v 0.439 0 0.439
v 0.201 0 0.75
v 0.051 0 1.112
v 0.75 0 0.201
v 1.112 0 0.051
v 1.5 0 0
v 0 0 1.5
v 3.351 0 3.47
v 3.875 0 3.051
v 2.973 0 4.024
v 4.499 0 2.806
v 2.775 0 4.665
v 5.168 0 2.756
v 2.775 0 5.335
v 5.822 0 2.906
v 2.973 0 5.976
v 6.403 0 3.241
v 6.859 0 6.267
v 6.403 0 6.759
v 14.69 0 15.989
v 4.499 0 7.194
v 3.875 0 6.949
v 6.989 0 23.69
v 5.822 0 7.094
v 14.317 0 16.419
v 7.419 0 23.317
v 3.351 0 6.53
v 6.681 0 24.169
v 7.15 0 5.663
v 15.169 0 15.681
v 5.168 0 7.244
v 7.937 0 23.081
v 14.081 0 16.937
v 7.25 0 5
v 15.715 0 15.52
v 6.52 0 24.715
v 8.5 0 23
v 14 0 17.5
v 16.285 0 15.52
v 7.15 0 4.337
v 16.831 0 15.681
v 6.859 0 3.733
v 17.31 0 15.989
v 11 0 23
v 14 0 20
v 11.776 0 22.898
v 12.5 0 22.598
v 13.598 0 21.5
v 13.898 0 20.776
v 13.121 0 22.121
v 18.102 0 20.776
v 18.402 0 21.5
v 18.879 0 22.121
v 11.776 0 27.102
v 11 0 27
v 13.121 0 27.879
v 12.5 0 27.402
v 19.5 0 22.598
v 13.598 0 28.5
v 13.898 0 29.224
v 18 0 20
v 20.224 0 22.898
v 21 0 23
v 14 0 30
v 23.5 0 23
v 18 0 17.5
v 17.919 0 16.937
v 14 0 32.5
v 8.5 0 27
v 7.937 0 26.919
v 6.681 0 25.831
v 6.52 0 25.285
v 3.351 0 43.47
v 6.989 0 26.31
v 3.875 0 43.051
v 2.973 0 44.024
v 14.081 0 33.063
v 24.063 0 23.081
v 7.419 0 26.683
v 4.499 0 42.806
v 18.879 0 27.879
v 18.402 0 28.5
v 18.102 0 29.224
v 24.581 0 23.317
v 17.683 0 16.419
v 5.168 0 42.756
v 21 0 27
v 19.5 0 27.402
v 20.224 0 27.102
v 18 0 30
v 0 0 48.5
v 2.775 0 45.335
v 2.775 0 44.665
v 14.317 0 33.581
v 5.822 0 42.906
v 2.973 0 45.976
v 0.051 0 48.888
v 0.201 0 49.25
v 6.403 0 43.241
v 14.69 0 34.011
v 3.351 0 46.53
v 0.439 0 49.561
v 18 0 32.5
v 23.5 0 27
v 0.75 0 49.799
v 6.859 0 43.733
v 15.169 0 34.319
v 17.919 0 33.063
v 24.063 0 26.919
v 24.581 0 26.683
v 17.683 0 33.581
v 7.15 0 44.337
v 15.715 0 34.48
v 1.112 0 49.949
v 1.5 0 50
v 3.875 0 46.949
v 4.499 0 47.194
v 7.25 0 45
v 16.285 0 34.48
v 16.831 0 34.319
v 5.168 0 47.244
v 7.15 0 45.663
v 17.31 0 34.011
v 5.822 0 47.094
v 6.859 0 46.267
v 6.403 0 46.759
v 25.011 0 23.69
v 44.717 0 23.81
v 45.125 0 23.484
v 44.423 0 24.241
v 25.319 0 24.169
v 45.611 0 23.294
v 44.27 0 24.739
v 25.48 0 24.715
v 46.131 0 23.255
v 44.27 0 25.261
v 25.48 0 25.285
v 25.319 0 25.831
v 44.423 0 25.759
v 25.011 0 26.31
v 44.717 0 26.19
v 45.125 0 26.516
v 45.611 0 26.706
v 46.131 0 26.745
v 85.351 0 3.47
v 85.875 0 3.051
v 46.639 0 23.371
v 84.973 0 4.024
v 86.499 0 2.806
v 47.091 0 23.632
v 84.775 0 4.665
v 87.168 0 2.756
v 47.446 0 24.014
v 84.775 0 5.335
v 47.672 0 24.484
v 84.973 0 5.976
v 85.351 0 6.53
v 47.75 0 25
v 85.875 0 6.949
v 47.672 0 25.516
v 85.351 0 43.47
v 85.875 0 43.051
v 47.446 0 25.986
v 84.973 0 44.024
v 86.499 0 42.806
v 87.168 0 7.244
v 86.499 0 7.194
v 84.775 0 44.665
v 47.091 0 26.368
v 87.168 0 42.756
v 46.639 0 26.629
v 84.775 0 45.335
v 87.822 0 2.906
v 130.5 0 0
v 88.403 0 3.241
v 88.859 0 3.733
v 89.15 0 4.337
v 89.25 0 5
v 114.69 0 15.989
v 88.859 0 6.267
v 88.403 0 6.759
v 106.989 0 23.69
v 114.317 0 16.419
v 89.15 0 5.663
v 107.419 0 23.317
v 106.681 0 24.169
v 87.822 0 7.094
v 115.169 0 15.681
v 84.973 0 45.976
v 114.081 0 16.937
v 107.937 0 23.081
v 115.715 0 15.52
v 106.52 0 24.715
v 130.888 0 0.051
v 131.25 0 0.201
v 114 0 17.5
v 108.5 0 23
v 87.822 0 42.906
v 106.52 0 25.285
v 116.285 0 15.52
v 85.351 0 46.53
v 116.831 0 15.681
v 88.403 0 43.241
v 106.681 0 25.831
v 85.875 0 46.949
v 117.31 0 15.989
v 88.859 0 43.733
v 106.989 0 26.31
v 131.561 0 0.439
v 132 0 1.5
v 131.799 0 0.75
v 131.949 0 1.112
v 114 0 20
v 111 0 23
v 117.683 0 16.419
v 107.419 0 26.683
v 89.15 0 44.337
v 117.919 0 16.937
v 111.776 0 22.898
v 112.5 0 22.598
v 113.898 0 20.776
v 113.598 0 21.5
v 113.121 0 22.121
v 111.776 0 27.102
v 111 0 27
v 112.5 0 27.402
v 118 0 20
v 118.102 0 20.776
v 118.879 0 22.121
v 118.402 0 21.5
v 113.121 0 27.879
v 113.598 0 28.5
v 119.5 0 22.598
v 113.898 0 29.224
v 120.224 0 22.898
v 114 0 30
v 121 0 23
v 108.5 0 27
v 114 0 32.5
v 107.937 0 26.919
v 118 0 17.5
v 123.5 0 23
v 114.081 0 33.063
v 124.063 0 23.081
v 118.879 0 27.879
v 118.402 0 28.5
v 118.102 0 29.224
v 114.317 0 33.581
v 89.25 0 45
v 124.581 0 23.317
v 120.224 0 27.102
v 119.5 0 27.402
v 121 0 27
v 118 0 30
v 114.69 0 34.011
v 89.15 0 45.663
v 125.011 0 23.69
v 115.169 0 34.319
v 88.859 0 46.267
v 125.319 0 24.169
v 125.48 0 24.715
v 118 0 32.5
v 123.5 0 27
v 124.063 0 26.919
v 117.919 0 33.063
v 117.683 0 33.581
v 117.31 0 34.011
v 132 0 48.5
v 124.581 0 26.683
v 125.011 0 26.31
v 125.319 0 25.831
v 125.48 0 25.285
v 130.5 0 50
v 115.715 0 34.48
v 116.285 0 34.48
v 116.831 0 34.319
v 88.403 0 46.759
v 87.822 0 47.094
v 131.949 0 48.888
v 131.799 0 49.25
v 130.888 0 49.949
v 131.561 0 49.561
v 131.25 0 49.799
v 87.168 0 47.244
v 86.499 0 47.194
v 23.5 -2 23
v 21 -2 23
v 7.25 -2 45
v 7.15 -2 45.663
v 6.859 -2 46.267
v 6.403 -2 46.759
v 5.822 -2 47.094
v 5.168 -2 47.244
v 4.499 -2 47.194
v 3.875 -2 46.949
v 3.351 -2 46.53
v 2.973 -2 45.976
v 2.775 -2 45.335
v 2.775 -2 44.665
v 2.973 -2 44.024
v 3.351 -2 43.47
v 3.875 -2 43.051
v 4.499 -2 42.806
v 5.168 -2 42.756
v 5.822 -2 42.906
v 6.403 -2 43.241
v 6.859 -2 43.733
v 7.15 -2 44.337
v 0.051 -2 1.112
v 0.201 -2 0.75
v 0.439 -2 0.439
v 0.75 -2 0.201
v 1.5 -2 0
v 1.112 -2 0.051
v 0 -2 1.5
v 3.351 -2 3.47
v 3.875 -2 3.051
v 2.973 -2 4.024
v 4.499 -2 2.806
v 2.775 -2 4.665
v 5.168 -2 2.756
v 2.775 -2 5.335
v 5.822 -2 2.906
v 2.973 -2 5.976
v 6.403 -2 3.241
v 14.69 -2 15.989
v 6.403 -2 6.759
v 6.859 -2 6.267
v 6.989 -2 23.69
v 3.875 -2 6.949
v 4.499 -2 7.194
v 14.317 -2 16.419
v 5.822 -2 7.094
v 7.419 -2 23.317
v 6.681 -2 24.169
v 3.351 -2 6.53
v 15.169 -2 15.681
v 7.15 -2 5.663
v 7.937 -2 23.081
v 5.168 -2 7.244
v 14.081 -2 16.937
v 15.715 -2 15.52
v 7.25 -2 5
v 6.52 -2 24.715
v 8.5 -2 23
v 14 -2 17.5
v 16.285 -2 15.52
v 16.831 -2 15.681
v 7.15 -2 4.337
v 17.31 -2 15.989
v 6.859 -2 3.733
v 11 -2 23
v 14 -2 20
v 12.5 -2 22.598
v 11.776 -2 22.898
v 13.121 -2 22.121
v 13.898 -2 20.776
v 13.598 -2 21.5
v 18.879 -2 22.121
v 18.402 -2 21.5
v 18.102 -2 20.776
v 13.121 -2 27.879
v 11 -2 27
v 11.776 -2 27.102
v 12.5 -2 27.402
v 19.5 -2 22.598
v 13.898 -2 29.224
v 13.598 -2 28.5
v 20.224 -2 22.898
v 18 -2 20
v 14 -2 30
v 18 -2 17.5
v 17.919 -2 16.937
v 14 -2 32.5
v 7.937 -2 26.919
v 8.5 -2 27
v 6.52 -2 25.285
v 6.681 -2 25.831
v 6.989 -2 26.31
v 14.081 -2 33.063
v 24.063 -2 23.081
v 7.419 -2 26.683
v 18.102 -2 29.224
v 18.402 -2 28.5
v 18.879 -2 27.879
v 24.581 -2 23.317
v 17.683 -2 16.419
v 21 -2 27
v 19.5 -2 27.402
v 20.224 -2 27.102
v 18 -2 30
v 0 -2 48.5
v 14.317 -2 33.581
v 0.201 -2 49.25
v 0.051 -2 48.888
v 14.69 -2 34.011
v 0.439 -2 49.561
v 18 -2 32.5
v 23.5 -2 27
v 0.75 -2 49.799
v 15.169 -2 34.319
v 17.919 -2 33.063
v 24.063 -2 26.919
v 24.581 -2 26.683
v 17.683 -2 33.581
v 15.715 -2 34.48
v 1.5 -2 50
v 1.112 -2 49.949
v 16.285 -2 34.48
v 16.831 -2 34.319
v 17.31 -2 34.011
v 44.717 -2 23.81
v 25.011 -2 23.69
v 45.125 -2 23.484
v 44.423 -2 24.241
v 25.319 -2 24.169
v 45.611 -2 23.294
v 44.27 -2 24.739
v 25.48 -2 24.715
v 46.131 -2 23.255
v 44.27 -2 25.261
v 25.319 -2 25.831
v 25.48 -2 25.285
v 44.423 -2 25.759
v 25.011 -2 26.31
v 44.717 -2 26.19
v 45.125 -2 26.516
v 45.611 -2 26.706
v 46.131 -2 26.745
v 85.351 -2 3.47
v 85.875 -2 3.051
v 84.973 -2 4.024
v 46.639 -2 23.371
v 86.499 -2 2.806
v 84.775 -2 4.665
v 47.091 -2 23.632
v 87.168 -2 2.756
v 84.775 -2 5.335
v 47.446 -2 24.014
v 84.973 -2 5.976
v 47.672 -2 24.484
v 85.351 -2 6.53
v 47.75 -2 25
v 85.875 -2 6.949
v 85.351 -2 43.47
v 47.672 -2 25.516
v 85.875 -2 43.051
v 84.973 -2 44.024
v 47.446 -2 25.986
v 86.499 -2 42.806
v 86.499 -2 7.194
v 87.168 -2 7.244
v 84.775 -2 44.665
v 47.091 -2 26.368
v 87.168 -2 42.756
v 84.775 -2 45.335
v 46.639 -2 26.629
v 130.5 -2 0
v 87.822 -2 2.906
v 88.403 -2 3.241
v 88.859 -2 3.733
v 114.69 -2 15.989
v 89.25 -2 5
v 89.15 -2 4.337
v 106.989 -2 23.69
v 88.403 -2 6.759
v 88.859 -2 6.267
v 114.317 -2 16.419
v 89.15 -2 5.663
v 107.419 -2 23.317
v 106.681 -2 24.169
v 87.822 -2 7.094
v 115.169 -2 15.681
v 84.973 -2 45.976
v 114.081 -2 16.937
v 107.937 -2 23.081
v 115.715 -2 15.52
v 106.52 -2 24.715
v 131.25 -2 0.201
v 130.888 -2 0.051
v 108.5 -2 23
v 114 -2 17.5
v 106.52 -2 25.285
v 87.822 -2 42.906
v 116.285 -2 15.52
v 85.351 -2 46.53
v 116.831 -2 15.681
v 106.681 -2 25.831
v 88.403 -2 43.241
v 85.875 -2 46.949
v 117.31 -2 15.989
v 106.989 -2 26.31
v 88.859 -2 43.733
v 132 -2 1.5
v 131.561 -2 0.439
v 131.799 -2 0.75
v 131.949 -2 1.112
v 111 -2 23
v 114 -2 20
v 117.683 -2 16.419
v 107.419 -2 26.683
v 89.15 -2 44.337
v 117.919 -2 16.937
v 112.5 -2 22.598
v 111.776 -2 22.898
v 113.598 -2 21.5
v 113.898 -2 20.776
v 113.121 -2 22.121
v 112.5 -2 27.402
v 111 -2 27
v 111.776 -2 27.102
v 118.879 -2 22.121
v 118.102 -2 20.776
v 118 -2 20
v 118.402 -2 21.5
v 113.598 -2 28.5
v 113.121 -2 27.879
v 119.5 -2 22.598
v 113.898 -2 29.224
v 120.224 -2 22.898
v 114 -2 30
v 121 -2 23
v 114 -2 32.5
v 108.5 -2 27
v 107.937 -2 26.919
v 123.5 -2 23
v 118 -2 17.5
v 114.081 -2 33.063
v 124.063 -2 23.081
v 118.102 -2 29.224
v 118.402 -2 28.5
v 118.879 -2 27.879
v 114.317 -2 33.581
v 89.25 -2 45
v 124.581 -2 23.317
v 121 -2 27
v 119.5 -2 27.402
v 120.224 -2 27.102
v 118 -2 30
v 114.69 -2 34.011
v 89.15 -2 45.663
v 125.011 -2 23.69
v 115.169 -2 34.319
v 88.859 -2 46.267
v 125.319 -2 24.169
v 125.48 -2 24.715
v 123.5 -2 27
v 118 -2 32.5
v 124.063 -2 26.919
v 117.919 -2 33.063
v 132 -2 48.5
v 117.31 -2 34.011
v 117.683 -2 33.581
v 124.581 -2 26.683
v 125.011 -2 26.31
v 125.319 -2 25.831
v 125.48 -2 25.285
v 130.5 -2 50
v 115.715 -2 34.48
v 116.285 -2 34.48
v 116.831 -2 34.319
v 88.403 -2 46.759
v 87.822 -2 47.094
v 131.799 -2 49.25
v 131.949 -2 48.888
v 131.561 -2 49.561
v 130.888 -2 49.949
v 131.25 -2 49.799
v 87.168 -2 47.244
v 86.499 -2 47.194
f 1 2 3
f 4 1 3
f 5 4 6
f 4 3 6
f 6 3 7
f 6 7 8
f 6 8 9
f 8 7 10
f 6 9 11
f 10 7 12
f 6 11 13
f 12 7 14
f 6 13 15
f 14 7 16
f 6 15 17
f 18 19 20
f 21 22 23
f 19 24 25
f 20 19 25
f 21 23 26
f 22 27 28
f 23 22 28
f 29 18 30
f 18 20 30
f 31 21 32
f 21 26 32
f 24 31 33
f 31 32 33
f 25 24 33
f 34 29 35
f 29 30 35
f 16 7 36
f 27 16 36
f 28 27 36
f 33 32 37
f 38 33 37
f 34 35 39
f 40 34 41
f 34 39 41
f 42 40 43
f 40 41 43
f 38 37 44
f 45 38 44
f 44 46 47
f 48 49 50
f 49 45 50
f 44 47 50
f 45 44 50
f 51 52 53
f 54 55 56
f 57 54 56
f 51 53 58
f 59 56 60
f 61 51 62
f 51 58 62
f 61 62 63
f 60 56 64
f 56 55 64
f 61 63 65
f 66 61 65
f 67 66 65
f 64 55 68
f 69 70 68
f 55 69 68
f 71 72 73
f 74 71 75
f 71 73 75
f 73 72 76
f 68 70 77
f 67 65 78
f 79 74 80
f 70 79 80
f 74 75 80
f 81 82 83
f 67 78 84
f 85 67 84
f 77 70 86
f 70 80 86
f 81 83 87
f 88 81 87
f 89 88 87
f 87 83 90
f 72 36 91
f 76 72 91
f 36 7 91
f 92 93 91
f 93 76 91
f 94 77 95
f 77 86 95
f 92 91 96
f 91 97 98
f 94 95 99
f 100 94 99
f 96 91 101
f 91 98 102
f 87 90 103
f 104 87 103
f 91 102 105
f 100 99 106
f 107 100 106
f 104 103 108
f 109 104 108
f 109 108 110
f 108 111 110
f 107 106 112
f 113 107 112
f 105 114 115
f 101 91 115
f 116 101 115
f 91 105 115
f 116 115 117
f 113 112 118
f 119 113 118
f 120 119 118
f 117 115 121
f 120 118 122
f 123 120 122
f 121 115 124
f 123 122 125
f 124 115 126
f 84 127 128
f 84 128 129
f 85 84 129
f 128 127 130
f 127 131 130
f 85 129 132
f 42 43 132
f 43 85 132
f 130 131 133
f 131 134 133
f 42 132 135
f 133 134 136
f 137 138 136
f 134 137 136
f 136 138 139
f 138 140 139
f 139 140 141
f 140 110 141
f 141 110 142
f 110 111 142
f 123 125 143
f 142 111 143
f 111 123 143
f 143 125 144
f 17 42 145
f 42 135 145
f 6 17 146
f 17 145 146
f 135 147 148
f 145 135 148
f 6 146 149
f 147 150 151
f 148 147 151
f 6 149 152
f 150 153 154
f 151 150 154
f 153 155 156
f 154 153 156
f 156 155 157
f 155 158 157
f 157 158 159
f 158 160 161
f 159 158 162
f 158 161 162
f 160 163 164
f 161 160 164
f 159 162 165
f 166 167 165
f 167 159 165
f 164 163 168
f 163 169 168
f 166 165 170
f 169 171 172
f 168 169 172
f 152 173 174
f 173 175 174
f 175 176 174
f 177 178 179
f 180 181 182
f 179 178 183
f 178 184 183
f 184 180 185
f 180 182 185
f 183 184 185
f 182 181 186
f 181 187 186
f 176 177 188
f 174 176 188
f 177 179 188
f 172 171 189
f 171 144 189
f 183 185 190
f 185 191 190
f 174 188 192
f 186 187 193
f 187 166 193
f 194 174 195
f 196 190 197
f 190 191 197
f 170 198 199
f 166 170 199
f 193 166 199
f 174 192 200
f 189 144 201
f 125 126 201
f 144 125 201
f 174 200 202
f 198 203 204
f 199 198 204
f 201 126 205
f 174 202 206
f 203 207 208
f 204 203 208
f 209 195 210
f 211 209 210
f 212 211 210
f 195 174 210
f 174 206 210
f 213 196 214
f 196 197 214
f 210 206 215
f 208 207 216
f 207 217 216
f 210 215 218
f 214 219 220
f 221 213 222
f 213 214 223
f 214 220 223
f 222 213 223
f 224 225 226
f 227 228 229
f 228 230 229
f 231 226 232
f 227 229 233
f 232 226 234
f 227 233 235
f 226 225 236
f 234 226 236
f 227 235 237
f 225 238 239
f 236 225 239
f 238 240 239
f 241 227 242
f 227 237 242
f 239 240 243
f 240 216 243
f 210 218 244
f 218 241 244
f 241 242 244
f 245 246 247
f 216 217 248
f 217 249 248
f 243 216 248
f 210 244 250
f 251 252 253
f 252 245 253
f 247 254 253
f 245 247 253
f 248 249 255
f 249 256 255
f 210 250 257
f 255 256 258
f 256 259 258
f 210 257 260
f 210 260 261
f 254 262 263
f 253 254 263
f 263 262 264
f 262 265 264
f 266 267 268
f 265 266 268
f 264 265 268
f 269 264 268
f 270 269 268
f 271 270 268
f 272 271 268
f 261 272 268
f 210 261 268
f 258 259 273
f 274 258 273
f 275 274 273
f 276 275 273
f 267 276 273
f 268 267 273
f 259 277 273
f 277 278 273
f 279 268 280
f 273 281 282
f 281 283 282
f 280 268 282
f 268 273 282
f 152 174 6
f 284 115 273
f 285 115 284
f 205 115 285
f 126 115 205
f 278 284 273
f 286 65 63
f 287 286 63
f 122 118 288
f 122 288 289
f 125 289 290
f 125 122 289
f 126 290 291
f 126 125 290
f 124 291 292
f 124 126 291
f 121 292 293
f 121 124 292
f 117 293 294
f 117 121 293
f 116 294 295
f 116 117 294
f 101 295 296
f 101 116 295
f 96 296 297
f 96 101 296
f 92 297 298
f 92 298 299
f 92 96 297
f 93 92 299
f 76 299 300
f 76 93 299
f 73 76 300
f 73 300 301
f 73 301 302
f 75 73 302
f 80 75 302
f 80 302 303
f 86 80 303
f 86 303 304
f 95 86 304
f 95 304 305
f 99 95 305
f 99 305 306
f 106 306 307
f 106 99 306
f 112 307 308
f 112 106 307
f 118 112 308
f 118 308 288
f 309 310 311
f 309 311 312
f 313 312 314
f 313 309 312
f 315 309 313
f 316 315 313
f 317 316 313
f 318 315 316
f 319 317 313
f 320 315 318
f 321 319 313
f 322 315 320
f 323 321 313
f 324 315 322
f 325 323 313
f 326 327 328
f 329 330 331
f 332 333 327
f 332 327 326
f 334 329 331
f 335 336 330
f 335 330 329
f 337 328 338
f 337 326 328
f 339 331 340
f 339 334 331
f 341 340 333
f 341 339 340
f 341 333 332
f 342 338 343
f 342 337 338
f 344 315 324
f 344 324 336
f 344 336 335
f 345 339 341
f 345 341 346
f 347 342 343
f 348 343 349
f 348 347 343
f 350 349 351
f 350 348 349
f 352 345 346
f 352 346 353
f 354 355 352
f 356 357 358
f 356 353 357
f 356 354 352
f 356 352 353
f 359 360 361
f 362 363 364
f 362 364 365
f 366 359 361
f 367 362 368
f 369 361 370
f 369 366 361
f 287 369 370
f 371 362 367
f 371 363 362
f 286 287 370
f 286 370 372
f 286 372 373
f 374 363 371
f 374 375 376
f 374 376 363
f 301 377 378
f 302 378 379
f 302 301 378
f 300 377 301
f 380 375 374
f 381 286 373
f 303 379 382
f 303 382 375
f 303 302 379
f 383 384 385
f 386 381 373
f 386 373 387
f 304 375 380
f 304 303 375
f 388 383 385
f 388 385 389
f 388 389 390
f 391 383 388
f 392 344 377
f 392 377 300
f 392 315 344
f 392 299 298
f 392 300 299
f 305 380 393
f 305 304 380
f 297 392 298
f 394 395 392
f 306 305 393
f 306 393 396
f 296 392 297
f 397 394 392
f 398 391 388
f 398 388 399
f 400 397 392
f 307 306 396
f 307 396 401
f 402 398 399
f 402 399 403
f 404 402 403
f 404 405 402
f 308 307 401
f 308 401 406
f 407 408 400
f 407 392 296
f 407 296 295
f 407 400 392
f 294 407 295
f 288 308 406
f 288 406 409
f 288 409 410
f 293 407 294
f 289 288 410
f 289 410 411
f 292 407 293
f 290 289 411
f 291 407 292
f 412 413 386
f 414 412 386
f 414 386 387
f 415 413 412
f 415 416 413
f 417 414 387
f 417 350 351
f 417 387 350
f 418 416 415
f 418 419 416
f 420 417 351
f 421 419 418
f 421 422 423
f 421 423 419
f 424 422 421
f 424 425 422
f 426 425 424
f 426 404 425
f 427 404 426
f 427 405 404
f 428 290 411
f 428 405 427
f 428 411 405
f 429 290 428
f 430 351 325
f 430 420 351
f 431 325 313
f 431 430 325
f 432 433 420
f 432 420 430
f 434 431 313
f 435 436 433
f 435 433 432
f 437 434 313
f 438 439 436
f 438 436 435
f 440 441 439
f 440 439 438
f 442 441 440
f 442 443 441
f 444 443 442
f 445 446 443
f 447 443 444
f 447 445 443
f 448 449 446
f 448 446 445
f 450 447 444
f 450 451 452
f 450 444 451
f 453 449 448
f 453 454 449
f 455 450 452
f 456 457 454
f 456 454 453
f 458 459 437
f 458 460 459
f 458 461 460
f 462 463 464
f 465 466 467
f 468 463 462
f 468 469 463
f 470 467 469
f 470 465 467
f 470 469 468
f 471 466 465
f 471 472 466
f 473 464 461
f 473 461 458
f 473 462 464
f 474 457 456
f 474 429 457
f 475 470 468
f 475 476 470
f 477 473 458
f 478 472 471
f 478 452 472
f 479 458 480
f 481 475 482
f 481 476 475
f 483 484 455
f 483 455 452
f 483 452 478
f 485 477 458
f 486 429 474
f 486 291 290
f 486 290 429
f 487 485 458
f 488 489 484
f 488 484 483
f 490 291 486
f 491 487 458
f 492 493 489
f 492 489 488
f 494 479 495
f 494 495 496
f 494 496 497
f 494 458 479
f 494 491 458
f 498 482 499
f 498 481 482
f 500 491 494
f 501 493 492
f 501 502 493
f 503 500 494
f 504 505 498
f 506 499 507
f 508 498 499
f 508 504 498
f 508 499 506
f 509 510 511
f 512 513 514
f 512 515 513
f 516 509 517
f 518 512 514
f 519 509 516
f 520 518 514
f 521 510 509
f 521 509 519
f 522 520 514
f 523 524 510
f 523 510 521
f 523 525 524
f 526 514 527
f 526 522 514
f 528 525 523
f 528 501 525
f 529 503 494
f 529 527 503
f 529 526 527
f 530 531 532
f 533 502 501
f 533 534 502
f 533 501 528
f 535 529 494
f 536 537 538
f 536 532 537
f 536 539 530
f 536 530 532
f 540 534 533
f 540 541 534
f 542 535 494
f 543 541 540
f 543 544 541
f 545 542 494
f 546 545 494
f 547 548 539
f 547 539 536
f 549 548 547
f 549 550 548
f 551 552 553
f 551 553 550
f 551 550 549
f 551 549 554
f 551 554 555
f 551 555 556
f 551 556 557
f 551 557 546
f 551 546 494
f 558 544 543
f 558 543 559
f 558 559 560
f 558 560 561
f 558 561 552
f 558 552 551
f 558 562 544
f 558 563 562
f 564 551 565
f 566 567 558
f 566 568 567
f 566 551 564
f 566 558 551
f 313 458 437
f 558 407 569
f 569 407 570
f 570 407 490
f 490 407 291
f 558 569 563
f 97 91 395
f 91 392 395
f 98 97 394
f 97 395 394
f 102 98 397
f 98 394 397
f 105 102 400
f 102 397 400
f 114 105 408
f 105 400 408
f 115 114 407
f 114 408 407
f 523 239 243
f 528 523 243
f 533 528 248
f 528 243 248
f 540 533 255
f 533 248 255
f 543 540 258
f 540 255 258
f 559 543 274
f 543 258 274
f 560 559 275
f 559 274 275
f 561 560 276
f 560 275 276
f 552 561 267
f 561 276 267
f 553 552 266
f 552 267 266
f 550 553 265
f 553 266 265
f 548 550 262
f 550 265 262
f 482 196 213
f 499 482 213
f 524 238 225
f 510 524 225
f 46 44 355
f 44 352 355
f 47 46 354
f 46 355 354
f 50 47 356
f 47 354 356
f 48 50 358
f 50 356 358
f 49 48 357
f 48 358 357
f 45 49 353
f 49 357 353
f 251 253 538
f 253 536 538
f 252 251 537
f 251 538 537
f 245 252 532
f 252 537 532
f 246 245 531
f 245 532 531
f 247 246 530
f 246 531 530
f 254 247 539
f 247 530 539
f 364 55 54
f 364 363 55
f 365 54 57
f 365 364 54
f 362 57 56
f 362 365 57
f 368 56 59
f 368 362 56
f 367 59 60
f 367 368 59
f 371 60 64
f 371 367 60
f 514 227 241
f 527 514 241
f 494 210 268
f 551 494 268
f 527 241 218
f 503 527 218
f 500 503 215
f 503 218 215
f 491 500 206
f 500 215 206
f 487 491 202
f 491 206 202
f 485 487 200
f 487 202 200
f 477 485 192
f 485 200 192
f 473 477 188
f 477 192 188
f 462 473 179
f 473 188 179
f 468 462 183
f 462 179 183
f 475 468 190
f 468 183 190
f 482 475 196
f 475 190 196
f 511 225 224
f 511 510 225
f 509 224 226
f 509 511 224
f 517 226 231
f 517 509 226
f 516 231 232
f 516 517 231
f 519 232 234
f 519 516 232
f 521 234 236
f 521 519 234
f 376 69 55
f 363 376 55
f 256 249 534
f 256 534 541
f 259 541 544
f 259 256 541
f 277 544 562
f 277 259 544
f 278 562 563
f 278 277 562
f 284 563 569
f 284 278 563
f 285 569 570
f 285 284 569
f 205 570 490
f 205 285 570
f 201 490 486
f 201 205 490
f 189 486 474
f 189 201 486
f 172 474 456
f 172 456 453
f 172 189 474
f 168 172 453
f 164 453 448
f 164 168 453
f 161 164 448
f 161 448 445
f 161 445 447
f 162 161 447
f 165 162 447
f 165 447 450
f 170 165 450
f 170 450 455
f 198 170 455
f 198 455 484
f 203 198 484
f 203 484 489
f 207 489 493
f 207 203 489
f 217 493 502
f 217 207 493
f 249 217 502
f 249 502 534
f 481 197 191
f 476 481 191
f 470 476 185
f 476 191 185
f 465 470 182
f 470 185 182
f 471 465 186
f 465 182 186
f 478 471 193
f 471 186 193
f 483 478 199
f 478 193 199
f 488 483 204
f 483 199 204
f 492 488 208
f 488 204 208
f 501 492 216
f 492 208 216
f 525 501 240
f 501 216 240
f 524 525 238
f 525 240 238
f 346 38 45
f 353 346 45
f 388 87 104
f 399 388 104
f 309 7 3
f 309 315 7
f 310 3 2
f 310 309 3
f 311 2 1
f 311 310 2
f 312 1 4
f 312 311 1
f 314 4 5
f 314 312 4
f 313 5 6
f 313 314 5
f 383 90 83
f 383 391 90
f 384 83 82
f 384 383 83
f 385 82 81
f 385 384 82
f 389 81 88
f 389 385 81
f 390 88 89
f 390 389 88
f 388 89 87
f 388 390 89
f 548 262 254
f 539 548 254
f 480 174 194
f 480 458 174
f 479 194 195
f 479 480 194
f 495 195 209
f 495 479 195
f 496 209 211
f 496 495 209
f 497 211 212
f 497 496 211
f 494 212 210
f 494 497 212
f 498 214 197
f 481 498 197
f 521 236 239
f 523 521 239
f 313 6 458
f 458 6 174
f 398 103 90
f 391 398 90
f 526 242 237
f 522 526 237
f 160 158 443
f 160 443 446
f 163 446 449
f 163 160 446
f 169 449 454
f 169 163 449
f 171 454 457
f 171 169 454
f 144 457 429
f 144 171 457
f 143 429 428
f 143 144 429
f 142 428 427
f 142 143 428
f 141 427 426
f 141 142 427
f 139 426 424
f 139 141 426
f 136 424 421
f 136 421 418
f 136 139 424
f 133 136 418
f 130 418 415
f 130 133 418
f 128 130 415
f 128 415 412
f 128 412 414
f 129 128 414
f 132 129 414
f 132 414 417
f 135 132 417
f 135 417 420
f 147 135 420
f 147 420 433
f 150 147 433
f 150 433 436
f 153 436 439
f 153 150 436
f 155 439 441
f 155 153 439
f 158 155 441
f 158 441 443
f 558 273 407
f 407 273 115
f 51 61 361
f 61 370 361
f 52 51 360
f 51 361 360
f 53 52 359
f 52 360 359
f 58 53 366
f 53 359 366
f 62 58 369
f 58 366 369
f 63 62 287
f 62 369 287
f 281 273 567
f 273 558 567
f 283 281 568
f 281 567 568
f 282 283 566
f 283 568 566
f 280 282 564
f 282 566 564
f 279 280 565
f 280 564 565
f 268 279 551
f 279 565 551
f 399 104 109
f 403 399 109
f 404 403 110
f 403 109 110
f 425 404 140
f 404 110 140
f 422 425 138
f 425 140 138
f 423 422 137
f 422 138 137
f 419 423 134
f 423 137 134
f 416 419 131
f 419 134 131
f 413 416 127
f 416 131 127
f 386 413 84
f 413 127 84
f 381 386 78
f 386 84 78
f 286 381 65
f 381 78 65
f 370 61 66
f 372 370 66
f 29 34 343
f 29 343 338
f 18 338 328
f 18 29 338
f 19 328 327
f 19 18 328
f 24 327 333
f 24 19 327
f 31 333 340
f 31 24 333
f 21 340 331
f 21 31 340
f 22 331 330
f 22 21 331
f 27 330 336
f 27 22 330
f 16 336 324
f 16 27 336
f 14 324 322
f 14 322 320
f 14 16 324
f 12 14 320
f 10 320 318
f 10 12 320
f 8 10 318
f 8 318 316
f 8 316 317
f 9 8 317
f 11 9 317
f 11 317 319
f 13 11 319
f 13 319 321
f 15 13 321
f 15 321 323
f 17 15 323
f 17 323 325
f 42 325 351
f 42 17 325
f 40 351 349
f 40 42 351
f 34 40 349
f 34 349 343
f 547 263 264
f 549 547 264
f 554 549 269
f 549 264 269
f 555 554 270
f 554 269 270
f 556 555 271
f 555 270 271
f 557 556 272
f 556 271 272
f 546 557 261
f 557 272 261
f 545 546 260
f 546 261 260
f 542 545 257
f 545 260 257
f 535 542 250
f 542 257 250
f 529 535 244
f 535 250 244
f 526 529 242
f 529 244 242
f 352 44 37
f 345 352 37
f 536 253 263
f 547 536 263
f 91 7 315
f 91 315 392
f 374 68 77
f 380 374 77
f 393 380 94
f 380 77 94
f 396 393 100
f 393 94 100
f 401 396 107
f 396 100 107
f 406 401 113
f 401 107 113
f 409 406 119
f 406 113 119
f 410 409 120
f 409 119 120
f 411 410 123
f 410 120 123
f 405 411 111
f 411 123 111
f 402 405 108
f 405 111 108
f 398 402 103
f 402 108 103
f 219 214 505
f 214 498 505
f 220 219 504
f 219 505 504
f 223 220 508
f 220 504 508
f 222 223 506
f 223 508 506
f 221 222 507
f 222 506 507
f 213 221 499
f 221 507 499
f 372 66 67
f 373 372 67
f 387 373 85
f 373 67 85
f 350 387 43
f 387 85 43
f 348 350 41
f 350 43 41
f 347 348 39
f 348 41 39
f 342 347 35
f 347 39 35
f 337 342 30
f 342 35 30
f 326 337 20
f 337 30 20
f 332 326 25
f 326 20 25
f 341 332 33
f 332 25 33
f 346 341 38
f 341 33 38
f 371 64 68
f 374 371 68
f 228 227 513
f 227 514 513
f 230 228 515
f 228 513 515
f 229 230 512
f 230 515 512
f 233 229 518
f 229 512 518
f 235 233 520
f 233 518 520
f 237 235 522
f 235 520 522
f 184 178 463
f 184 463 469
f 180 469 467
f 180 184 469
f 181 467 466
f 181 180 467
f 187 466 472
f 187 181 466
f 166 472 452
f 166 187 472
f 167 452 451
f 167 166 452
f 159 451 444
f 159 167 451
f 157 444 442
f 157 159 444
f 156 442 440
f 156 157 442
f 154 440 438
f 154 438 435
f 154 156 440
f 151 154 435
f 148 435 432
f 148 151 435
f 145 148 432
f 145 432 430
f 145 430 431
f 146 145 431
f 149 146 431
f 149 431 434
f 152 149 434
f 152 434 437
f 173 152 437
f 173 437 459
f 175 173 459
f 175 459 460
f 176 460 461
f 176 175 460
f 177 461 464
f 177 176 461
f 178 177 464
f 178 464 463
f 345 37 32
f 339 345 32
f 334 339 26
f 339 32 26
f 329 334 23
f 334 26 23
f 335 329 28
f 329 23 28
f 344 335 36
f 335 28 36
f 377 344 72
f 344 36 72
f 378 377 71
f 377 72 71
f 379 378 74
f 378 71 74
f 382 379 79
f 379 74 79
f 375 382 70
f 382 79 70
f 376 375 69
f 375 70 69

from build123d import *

# Parameters (mm, degrees)
F0_W     = 92
F0_H     = 50
F0_R     = 2.25
F0_R_2   = 1.75
F0_W_2   = 40
F1_DEPTH = 2
F2_R     = 3
F3_R     = 1.5


# Not quite as in the source:
# - a feature names something its author has since deleted; it is built from what else it names


with BuildPart() as f1:
    # F0 (on Front) → F1 (new body)
    with BuildSketch(Plane.XZ):
        with Locations((46, 25)):
            Rectangle(F0_W, F0_H)
        with Locations((5, 5)):
            Circle(F0_R, mode=Mode.SUBTRACT)
        with Locations((87, 5)):
            Circle(F0_R, mode=Mode.SUBTRACT)
        with BuildLine():
            Line((8.5, 27), (14, 27))
            Line((14, 27), (14, 32.5))
            ThreePointArc((14, 32.5), (16, 34.5), (18, 32.5))
            Line((18, 32.5), (18, 27))
            Line((18, 27), (23.5, 27))
            ThreePointArc((23.5, 27), (25.5, 25), (23.5, 23))
            Line((23.5, 23), (18, 23))
            Line((18, 23), (18, 17.5))
            ThreePointArc((18, 17.5), (16, 15.5), (14, 17.5))
            Line((14, 17.5), (14, 23))
            Line((14, 23), (8.5, 23))
            ThreePointArc((8.5, 23), (6.5, 25), (8.5, 27))
        make_face(mode=Mode.SUBTRACT)
        with Locations((46, 25)):
            Circle(F0_R_2, mode=Mode.SUBTRACT)
        with Locations((5, 45)):
            Circle(F0_R, mode=Mode.SUBTRACT)
        with Locations((87, 45)):
            Circle(F0_R, mode=Mode.SUBTRACT)
        with Locations((112, 25)):
            Rectangle(F0_W_2, F0_H)
        with BuildLine():
            Line((114, 27), (114, 32.5))
            ThreePointArc((114, 32.5), (116, 34.5), (118, 32.5))
            Line((118, 32.5), (118, 27))
            Line((118, 27), (123.5, 27))
            ThreePointArc((123.5, 27), (125.5, 25), (123.5, 23))
            Line((123.5, 23), (118, 23))
            Line((118, 23), (118, 17.5))
            ThreePointArc((118, 17.5), (116, 15.5), (114, 17.5))
            Line((114, 17.5), (114, 23))
            Line((114, 23), (108.5, 23))
            ThreePointArc((108.5, 23), (106.5, 25), (108.5, 27))
            Line((108.5, 27), (114, 27))
        make_face(mode=Mode.SUBTRACT)
    extrude(amount=F1_DEPTH)

    # F2
    f2_edges = [f1.edges().sort_by_distance(p)[0] for p in [
        (14, -1, 27),
        (14, -1, 23),
        (18, -1, 27),
        (18, -1, 23),
        (114, -1, 27),
        (118, -1, 27),
        (114, -1, 23),
        (118, -1, 23),
    ]]
    fillet(f2_edges, radius=F2_R)

    # F3
    f3_edges = [f1.edges().sort_by_distance(p)[0] for p in [
        (0, -1, 50),
        (0, -1, 0),
        (132, -1, 0),
        (132, -1, 50),
    ]]
    fillet(f3_edges, radius=F3_R)


solid = f1.part
